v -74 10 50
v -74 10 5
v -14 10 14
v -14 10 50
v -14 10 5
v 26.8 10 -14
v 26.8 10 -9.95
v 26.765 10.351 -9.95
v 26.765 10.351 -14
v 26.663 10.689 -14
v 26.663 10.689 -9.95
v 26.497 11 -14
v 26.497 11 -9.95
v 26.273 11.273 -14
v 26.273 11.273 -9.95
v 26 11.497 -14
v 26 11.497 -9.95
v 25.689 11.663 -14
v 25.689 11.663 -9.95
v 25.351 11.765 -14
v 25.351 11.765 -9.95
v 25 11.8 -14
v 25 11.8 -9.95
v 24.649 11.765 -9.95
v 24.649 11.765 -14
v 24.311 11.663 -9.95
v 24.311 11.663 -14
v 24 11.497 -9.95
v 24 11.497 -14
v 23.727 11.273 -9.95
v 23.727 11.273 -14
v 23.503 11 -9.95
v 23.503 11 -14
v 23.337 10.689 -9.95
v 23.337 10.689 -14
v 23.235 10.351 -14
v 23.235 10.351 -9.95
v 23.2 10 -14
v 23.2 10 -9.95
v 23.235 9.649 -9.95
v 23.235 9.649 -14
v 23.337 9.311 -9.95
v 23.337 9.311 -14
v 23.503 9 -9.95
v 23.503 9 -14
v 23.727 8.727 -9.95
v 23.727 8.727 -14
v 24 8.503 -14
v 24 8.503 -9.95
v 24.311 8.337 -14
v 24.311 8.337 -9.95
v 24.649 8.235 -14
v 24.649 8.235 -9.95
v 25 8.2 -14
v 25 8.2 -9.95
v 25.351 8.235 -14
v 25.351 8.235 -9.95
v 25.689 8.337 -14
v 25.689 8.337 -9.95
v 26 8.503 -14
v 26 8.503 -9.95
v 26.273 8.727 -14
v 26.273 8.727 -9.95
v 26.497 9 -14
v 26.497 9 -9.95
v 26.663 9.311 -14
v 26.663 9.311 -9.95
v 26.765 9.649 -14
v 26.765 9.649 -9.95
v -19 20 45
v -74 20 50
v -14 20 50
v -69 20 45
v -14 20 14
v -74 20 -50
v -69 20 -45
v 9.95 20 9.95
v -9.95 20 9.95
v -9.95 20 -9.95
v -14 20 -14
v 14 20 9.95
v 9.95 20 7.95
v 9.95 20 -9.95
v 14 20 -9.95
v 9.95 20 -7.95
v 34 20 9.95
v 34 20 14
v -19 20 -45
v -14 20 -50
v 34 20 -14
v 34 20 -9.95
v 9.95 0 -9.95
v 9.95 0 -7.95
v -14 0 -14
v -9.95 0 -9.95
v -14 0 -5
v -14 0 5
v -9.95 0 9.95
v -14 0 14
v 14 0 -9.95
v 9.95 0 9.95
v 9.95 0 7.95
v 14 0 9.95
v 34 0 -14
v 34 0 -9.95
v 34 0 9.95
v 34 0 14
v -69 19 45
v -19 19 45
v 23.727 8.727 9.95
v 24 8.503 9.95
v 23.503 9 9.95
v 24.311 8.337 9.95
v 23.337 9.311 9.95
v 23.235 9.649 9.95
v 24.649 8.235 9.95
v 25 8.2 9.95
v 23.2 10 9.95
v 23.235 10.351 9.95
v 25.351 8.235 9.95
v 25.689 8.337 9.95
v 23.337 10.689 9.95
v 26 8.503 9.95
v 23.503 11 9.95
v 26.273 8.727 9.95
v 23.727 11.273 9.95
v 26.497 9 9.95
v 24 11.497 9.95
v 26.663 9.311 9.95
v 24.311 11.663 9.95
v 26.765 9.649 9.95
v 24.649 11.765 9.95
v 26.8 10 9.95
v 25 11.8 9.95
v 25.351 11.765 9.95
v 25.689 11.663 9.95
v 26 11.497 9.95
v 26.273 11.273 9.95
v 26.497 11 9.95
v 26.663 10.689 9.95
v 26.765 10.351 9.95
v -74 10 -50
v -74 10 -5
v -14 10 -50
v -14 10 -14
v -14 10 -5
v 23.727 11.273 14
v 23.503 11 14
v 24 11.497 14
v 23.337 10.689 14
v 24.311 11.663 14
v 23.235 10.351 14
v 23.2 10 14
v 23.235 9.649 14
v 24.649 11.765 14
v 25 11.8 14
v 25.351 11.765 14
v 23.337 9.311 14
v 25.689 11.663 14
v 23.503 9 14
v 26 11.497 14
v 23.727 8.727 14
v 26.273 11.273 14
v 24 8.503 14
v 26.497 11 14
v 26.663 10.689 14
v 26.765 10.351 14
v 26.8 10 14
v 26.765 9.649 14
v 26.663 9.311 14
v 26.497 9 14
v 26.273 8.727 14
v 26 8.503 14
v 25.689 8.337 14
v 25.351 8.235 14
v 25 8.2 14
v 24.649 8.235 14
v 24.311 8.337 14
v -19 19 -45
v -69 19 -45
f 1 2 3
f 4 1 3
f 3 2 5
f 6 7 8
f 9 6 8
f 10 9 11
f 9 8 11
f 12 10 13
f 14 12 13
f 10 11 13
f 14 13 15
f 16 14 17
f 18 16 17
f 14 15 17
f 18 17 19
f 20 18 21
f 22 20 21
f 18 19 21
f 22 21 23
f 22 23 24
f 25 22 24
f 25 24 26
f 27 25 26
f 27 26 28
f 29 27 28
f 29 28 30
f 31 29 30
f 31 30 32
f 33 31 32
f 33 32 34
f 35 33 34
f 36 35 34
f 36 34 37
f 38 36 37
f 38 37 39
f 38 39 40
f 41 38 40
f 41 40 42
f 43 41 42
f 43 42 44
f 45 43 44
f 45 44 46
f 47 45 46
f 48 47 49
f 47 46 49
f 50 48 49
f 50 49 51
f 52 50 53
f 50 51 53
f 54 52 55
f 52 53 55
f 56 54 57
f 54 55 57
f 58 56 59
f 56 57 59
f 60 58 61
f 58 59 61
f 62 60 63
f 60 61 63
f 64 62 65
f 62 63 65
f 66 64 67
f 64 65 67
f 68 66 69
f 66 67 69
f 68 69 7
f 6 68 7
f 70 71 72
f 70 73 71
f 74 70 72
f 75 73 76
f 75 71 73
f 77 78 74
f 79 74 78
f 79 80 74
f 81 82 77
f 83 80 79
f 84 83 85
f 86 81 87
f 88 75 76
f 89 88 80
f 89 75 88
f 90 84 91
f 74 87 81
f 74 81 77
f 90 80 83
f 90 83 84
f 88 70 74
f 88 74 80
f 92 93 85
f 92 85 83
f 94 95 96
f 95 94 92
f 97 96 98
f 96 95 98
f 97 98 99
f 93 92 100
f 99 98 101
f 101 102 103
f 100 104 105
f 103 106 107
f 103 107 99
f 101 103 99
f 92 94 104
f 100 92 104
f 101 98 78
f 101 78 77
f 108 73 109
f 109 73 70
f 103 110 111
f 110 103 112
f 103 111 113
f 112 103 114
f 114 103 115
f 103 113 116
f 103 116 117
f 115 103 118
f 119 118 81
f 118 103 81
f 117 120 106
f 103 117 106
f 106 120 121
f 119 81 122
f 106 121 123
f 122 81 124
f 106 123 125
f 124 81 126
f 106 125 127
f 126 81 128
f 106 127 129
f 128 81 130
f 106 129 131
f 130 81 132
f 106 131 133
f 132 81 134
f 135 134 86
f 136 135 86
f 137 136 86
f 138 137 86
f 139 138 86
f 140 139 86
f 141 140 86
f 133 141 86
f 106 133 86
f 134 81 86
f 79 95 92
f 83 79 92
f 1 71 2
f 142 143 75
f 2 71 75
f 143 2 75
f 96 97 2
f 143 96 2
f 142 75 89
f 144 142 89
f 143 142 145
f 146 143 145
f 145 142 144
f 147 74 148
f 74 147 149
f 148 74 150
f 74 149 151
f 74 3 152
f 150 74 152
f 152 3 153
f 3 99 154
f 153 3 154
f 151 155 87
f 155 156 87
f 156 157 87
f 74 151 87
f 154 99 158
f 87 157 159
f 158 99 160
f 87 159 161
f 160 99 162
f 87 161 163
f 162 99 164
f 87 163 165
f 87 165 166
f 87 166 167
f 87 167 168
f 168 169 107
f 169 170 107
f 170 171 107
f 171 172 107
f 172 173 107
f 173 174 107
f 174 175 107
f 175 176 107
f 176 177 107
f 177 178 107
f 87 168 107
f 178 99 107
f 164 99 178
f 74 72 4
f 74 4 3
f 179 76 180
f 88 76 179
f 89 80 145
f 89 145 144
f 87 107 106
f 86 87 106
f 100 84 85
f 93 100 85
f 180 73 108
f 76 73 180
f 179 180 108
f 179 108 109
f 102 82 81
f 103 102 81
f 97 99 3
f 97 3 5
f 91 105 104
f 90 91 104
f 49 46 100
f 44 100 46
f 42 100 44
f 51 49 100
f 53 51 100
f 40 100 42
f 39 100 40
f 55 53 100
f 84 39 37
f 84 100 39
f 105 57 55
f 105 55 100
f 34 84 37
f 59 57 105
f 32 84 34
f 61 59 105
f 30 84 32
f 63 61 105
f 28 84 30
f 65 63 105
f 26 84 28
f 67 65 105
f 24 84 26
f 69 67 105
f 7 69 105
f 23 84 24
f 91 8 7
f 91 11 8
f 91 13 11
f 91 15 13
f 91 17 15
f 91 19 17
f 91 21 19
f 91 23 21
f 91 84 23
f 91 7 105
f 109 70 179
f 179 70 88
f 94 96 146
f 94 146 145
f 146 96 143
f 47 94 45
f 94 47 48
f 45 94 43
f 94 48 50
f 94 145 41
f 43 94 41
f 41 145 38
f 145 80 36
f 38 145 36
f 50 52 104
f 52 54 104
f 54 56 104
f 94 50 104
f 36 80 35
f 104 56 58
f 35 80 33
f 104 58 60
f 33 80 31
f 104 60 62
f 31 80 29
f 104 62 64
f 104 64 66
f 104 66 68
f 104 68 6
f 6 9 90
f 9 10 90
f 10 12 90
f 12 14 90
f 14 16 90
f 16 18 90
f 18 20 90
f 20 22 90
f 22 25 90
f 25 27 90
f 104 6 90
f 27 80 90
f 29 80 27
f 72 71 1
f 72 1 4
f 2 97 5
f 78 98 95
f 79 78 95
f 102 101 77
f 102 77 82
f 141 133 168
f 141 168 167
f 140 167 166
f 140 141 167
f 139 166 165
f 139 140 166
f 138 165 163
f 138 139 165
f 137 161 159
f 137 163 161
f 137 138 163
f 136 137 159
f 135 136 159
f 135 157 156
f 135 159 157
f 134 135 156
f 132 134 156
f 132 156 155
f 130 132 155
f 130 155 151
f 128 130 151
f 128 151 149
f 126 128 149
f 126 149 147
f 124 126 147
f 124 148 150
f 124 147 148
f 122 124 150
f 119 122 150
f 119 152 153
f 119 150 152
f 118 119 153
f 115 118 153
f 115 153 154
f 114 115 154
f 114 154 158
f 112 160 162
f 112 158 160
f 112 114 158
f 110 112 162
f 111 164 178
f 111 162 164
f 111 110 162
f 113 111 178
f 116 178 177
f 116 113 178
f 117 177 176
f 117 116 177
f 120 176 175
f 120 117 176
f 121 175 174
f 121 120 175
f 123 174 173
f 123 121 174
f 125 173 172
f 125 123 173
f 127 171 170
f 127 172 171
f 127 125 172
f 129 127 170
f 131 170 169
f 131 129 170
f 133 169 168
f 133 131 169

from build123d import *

# Parameters (mm, degrees)
SKETCH_1_W                      = 28
SKETCH_1_H                      = 28
SKETCH_1_W_2                    = 19.9
SKETCH_1_H_2                    = 19.9
EXTRUDE_1_DEPTH                 = 20
CUT_EXTRUDE_1_DEPTH             = 20
SKETCH_3_W                      = 20
SKETCH_3_H                      = 4.05
EXTRUDE_2_DEPTH                 = 20
CUT_EXTRUDE_2_REACH             = 48.148
SKETCH_4_R                      = 1.8
CUT_EXTRUDE_2_DIRECTION_2_REACH = 48.148
SKETCH_5_W                      = 60
SKETCH_5_H                      = 100
EXTRUDE_3_DEPTH                 = 10
SKETCH_6_W                      = 10
SKETCH_6_H                      = 10
EXTRUDE_4_DEPTH                 = 60
CUT_EXTRUDE_3_REACH             = 96.345
SKETCH_8_W                      = 50
SKETCH_8_H                      = 90
CUT_EXTRUDE_4_DEPTH             = 1


with BuildPart() as part:
    # 草图1 → 凸台-拉伸1 (new body)
    with BuildSketch(Plane(origin=(0, 0, 0), x_dir=(1, 0, 0), z_dir=(0, 1, 0))):
        Rectangle(SKETCH_1_W, SKETCH_1_H)
        Rectangle(SKETCH_1_W_2, SKETCH_1_H_2, mode=Mode.SUBTRACT)
    extrude(amount=EXTRUDE_1_DEPTH)

    # 草图2 → 切除-拉伸1 (cut)
    with BuildSketch(Plane(origin=(0, 20, 0), x_dir=(1, 0, 0), z_dir=(0, 1, 0))):
        Polygon((14, 9.95), (9.95, 7.95), (9.95, -7.95), (14, -9.95), align=None)
    extrude(amount=-CUT_EXTRUDE_1_DEPTH, mode=Mode.SUBTRACT)

    # 草图3 → 凸台-拉伸2 (add)
    with BuildSketch(Plane(origin=(0, 20, 0), x_dir=(1, 0, 0), z_dir=(0, 1, 0))):
        with Locations((24, 11.975)):
            Rectangle(SKETCH_3_W, SKETCH_3_H)
        with Locations((24, -11.975)):
            Rectangle(SKETCH_3_W, SKETCH_3_H)
    extrude(amount=-EXTRUDE_2_DEPTH)

    # 草图4 → 切除-拉伸2 (cut, up to next)
    with BuildSketch(Plane.XY.offset(-9.95), mode=Mode.PRIVATE) as cut_extrude_2_sk1:
        with Locations((25, 10)):
            Circle(SKETCH_4_R)
    cut_extrude_2_tool1 = extrude(cut_extrude_2_sk1.sketch, amount=-CUT_EXTRUDE_2_REACH, mode=Mode.PRIVATE) & part.part
    add(cut_extrude_2_tool1.solids().sort_by_distance((25, 10, -9.95))[0], mode=Mode.SUBTRACT)

    # 切除-拉伸2 direction 2: up to this face of the body (flat: up to its plane)
    cut_extrude_2_direction_2_end = Plane(part.part.faces().sort_by_distance((10, 10, 14))[0])
    # 草图4 → 切除-拉伸2 direction 2 (cut, up to the picked face)
    with BuildSketch(Plane.XY.offset(-9.95), mode=Mode.PRIVATE) as cut_extrude_2_direction_2_sk1:
        with Locations((25, 10)):
            Circle(SKETCH_4_R)
    cut_extrude_2_direction_2_tool1 = split(extrude(cut_extrude_2_direction_2_sk1.sketch, amount=CUT_EXTRUDE_2_DIRECTION_2_REACH, mode=Mode.PRIVATE), bisect_by=cut_extrude_2_direction_2_end, keep=Keep.BOTH, mode=Mode.PRIVATE)
    add(cut_extrude_2_direction_2_tool1.solids().sort_by(Axis((25, 10, -9.95), (0, 0, 1)))[0], mode=Mode.SUBTRACT)

    # 草图5 → 凸台-拉伸3 (add)
    with BuildSketch(Plane(origin=(0, 20, 0), x_dir=(1, 0, 0), z_dir=(0, 1, 0))):
        with Locations((-44, 0)):
            Rectangle(SKETCH_5_W, SKETCH_5_H)
    extrude(amount=-EXTRUDE_3_DEPTH)

    # 草图6 → 凸台-拉伸4 (add)
    with BuildSketch(Plane.ZY.offset(14)):
        with Locations((0, 5)):
            Rectangle(SKETCH_6_W, SKETCH_6_H)
    extrude(amount=EXTRUDE_4_DEPTH)

    # 草图7 → 切除-拉伸3 (cut, up to next)
    with BuildSketch(Plane.XY.offset(5), mode=Mode.PRIVATE) as cut_extrude_3_sk1:
        Polygon((-74, 10), (-74, 0), (-14, 0), align=None)
    cut_extrude_3_tool1 = extrude(cut_extrude_3_sk1.sketch, amount=-CUT_EXTRUDE_3_REACH, mode=Mode.PRIVATE) & part.part
    add(cut_extrude_3_tool1.solids().sort_by_distance((-54, 3.333333, 5))[0], mode=Mode.SUBTRACT)

    # 草图8 → 切除-拉伸4 (cut)
    with BuildSketch(Plane(origin=(0, 20, 0), x_dir=(1, 0, 0), z_dir=(0, 1, 0))):
        with Locations((-44, 0)):
            Rectangle(SKETCH_8_W, SKETCH_8_H)
    extrude(amount=-CUT_EXTRUDE_4_DEPTH, mode=Mode.SUBTRACT)


solid = part.part
